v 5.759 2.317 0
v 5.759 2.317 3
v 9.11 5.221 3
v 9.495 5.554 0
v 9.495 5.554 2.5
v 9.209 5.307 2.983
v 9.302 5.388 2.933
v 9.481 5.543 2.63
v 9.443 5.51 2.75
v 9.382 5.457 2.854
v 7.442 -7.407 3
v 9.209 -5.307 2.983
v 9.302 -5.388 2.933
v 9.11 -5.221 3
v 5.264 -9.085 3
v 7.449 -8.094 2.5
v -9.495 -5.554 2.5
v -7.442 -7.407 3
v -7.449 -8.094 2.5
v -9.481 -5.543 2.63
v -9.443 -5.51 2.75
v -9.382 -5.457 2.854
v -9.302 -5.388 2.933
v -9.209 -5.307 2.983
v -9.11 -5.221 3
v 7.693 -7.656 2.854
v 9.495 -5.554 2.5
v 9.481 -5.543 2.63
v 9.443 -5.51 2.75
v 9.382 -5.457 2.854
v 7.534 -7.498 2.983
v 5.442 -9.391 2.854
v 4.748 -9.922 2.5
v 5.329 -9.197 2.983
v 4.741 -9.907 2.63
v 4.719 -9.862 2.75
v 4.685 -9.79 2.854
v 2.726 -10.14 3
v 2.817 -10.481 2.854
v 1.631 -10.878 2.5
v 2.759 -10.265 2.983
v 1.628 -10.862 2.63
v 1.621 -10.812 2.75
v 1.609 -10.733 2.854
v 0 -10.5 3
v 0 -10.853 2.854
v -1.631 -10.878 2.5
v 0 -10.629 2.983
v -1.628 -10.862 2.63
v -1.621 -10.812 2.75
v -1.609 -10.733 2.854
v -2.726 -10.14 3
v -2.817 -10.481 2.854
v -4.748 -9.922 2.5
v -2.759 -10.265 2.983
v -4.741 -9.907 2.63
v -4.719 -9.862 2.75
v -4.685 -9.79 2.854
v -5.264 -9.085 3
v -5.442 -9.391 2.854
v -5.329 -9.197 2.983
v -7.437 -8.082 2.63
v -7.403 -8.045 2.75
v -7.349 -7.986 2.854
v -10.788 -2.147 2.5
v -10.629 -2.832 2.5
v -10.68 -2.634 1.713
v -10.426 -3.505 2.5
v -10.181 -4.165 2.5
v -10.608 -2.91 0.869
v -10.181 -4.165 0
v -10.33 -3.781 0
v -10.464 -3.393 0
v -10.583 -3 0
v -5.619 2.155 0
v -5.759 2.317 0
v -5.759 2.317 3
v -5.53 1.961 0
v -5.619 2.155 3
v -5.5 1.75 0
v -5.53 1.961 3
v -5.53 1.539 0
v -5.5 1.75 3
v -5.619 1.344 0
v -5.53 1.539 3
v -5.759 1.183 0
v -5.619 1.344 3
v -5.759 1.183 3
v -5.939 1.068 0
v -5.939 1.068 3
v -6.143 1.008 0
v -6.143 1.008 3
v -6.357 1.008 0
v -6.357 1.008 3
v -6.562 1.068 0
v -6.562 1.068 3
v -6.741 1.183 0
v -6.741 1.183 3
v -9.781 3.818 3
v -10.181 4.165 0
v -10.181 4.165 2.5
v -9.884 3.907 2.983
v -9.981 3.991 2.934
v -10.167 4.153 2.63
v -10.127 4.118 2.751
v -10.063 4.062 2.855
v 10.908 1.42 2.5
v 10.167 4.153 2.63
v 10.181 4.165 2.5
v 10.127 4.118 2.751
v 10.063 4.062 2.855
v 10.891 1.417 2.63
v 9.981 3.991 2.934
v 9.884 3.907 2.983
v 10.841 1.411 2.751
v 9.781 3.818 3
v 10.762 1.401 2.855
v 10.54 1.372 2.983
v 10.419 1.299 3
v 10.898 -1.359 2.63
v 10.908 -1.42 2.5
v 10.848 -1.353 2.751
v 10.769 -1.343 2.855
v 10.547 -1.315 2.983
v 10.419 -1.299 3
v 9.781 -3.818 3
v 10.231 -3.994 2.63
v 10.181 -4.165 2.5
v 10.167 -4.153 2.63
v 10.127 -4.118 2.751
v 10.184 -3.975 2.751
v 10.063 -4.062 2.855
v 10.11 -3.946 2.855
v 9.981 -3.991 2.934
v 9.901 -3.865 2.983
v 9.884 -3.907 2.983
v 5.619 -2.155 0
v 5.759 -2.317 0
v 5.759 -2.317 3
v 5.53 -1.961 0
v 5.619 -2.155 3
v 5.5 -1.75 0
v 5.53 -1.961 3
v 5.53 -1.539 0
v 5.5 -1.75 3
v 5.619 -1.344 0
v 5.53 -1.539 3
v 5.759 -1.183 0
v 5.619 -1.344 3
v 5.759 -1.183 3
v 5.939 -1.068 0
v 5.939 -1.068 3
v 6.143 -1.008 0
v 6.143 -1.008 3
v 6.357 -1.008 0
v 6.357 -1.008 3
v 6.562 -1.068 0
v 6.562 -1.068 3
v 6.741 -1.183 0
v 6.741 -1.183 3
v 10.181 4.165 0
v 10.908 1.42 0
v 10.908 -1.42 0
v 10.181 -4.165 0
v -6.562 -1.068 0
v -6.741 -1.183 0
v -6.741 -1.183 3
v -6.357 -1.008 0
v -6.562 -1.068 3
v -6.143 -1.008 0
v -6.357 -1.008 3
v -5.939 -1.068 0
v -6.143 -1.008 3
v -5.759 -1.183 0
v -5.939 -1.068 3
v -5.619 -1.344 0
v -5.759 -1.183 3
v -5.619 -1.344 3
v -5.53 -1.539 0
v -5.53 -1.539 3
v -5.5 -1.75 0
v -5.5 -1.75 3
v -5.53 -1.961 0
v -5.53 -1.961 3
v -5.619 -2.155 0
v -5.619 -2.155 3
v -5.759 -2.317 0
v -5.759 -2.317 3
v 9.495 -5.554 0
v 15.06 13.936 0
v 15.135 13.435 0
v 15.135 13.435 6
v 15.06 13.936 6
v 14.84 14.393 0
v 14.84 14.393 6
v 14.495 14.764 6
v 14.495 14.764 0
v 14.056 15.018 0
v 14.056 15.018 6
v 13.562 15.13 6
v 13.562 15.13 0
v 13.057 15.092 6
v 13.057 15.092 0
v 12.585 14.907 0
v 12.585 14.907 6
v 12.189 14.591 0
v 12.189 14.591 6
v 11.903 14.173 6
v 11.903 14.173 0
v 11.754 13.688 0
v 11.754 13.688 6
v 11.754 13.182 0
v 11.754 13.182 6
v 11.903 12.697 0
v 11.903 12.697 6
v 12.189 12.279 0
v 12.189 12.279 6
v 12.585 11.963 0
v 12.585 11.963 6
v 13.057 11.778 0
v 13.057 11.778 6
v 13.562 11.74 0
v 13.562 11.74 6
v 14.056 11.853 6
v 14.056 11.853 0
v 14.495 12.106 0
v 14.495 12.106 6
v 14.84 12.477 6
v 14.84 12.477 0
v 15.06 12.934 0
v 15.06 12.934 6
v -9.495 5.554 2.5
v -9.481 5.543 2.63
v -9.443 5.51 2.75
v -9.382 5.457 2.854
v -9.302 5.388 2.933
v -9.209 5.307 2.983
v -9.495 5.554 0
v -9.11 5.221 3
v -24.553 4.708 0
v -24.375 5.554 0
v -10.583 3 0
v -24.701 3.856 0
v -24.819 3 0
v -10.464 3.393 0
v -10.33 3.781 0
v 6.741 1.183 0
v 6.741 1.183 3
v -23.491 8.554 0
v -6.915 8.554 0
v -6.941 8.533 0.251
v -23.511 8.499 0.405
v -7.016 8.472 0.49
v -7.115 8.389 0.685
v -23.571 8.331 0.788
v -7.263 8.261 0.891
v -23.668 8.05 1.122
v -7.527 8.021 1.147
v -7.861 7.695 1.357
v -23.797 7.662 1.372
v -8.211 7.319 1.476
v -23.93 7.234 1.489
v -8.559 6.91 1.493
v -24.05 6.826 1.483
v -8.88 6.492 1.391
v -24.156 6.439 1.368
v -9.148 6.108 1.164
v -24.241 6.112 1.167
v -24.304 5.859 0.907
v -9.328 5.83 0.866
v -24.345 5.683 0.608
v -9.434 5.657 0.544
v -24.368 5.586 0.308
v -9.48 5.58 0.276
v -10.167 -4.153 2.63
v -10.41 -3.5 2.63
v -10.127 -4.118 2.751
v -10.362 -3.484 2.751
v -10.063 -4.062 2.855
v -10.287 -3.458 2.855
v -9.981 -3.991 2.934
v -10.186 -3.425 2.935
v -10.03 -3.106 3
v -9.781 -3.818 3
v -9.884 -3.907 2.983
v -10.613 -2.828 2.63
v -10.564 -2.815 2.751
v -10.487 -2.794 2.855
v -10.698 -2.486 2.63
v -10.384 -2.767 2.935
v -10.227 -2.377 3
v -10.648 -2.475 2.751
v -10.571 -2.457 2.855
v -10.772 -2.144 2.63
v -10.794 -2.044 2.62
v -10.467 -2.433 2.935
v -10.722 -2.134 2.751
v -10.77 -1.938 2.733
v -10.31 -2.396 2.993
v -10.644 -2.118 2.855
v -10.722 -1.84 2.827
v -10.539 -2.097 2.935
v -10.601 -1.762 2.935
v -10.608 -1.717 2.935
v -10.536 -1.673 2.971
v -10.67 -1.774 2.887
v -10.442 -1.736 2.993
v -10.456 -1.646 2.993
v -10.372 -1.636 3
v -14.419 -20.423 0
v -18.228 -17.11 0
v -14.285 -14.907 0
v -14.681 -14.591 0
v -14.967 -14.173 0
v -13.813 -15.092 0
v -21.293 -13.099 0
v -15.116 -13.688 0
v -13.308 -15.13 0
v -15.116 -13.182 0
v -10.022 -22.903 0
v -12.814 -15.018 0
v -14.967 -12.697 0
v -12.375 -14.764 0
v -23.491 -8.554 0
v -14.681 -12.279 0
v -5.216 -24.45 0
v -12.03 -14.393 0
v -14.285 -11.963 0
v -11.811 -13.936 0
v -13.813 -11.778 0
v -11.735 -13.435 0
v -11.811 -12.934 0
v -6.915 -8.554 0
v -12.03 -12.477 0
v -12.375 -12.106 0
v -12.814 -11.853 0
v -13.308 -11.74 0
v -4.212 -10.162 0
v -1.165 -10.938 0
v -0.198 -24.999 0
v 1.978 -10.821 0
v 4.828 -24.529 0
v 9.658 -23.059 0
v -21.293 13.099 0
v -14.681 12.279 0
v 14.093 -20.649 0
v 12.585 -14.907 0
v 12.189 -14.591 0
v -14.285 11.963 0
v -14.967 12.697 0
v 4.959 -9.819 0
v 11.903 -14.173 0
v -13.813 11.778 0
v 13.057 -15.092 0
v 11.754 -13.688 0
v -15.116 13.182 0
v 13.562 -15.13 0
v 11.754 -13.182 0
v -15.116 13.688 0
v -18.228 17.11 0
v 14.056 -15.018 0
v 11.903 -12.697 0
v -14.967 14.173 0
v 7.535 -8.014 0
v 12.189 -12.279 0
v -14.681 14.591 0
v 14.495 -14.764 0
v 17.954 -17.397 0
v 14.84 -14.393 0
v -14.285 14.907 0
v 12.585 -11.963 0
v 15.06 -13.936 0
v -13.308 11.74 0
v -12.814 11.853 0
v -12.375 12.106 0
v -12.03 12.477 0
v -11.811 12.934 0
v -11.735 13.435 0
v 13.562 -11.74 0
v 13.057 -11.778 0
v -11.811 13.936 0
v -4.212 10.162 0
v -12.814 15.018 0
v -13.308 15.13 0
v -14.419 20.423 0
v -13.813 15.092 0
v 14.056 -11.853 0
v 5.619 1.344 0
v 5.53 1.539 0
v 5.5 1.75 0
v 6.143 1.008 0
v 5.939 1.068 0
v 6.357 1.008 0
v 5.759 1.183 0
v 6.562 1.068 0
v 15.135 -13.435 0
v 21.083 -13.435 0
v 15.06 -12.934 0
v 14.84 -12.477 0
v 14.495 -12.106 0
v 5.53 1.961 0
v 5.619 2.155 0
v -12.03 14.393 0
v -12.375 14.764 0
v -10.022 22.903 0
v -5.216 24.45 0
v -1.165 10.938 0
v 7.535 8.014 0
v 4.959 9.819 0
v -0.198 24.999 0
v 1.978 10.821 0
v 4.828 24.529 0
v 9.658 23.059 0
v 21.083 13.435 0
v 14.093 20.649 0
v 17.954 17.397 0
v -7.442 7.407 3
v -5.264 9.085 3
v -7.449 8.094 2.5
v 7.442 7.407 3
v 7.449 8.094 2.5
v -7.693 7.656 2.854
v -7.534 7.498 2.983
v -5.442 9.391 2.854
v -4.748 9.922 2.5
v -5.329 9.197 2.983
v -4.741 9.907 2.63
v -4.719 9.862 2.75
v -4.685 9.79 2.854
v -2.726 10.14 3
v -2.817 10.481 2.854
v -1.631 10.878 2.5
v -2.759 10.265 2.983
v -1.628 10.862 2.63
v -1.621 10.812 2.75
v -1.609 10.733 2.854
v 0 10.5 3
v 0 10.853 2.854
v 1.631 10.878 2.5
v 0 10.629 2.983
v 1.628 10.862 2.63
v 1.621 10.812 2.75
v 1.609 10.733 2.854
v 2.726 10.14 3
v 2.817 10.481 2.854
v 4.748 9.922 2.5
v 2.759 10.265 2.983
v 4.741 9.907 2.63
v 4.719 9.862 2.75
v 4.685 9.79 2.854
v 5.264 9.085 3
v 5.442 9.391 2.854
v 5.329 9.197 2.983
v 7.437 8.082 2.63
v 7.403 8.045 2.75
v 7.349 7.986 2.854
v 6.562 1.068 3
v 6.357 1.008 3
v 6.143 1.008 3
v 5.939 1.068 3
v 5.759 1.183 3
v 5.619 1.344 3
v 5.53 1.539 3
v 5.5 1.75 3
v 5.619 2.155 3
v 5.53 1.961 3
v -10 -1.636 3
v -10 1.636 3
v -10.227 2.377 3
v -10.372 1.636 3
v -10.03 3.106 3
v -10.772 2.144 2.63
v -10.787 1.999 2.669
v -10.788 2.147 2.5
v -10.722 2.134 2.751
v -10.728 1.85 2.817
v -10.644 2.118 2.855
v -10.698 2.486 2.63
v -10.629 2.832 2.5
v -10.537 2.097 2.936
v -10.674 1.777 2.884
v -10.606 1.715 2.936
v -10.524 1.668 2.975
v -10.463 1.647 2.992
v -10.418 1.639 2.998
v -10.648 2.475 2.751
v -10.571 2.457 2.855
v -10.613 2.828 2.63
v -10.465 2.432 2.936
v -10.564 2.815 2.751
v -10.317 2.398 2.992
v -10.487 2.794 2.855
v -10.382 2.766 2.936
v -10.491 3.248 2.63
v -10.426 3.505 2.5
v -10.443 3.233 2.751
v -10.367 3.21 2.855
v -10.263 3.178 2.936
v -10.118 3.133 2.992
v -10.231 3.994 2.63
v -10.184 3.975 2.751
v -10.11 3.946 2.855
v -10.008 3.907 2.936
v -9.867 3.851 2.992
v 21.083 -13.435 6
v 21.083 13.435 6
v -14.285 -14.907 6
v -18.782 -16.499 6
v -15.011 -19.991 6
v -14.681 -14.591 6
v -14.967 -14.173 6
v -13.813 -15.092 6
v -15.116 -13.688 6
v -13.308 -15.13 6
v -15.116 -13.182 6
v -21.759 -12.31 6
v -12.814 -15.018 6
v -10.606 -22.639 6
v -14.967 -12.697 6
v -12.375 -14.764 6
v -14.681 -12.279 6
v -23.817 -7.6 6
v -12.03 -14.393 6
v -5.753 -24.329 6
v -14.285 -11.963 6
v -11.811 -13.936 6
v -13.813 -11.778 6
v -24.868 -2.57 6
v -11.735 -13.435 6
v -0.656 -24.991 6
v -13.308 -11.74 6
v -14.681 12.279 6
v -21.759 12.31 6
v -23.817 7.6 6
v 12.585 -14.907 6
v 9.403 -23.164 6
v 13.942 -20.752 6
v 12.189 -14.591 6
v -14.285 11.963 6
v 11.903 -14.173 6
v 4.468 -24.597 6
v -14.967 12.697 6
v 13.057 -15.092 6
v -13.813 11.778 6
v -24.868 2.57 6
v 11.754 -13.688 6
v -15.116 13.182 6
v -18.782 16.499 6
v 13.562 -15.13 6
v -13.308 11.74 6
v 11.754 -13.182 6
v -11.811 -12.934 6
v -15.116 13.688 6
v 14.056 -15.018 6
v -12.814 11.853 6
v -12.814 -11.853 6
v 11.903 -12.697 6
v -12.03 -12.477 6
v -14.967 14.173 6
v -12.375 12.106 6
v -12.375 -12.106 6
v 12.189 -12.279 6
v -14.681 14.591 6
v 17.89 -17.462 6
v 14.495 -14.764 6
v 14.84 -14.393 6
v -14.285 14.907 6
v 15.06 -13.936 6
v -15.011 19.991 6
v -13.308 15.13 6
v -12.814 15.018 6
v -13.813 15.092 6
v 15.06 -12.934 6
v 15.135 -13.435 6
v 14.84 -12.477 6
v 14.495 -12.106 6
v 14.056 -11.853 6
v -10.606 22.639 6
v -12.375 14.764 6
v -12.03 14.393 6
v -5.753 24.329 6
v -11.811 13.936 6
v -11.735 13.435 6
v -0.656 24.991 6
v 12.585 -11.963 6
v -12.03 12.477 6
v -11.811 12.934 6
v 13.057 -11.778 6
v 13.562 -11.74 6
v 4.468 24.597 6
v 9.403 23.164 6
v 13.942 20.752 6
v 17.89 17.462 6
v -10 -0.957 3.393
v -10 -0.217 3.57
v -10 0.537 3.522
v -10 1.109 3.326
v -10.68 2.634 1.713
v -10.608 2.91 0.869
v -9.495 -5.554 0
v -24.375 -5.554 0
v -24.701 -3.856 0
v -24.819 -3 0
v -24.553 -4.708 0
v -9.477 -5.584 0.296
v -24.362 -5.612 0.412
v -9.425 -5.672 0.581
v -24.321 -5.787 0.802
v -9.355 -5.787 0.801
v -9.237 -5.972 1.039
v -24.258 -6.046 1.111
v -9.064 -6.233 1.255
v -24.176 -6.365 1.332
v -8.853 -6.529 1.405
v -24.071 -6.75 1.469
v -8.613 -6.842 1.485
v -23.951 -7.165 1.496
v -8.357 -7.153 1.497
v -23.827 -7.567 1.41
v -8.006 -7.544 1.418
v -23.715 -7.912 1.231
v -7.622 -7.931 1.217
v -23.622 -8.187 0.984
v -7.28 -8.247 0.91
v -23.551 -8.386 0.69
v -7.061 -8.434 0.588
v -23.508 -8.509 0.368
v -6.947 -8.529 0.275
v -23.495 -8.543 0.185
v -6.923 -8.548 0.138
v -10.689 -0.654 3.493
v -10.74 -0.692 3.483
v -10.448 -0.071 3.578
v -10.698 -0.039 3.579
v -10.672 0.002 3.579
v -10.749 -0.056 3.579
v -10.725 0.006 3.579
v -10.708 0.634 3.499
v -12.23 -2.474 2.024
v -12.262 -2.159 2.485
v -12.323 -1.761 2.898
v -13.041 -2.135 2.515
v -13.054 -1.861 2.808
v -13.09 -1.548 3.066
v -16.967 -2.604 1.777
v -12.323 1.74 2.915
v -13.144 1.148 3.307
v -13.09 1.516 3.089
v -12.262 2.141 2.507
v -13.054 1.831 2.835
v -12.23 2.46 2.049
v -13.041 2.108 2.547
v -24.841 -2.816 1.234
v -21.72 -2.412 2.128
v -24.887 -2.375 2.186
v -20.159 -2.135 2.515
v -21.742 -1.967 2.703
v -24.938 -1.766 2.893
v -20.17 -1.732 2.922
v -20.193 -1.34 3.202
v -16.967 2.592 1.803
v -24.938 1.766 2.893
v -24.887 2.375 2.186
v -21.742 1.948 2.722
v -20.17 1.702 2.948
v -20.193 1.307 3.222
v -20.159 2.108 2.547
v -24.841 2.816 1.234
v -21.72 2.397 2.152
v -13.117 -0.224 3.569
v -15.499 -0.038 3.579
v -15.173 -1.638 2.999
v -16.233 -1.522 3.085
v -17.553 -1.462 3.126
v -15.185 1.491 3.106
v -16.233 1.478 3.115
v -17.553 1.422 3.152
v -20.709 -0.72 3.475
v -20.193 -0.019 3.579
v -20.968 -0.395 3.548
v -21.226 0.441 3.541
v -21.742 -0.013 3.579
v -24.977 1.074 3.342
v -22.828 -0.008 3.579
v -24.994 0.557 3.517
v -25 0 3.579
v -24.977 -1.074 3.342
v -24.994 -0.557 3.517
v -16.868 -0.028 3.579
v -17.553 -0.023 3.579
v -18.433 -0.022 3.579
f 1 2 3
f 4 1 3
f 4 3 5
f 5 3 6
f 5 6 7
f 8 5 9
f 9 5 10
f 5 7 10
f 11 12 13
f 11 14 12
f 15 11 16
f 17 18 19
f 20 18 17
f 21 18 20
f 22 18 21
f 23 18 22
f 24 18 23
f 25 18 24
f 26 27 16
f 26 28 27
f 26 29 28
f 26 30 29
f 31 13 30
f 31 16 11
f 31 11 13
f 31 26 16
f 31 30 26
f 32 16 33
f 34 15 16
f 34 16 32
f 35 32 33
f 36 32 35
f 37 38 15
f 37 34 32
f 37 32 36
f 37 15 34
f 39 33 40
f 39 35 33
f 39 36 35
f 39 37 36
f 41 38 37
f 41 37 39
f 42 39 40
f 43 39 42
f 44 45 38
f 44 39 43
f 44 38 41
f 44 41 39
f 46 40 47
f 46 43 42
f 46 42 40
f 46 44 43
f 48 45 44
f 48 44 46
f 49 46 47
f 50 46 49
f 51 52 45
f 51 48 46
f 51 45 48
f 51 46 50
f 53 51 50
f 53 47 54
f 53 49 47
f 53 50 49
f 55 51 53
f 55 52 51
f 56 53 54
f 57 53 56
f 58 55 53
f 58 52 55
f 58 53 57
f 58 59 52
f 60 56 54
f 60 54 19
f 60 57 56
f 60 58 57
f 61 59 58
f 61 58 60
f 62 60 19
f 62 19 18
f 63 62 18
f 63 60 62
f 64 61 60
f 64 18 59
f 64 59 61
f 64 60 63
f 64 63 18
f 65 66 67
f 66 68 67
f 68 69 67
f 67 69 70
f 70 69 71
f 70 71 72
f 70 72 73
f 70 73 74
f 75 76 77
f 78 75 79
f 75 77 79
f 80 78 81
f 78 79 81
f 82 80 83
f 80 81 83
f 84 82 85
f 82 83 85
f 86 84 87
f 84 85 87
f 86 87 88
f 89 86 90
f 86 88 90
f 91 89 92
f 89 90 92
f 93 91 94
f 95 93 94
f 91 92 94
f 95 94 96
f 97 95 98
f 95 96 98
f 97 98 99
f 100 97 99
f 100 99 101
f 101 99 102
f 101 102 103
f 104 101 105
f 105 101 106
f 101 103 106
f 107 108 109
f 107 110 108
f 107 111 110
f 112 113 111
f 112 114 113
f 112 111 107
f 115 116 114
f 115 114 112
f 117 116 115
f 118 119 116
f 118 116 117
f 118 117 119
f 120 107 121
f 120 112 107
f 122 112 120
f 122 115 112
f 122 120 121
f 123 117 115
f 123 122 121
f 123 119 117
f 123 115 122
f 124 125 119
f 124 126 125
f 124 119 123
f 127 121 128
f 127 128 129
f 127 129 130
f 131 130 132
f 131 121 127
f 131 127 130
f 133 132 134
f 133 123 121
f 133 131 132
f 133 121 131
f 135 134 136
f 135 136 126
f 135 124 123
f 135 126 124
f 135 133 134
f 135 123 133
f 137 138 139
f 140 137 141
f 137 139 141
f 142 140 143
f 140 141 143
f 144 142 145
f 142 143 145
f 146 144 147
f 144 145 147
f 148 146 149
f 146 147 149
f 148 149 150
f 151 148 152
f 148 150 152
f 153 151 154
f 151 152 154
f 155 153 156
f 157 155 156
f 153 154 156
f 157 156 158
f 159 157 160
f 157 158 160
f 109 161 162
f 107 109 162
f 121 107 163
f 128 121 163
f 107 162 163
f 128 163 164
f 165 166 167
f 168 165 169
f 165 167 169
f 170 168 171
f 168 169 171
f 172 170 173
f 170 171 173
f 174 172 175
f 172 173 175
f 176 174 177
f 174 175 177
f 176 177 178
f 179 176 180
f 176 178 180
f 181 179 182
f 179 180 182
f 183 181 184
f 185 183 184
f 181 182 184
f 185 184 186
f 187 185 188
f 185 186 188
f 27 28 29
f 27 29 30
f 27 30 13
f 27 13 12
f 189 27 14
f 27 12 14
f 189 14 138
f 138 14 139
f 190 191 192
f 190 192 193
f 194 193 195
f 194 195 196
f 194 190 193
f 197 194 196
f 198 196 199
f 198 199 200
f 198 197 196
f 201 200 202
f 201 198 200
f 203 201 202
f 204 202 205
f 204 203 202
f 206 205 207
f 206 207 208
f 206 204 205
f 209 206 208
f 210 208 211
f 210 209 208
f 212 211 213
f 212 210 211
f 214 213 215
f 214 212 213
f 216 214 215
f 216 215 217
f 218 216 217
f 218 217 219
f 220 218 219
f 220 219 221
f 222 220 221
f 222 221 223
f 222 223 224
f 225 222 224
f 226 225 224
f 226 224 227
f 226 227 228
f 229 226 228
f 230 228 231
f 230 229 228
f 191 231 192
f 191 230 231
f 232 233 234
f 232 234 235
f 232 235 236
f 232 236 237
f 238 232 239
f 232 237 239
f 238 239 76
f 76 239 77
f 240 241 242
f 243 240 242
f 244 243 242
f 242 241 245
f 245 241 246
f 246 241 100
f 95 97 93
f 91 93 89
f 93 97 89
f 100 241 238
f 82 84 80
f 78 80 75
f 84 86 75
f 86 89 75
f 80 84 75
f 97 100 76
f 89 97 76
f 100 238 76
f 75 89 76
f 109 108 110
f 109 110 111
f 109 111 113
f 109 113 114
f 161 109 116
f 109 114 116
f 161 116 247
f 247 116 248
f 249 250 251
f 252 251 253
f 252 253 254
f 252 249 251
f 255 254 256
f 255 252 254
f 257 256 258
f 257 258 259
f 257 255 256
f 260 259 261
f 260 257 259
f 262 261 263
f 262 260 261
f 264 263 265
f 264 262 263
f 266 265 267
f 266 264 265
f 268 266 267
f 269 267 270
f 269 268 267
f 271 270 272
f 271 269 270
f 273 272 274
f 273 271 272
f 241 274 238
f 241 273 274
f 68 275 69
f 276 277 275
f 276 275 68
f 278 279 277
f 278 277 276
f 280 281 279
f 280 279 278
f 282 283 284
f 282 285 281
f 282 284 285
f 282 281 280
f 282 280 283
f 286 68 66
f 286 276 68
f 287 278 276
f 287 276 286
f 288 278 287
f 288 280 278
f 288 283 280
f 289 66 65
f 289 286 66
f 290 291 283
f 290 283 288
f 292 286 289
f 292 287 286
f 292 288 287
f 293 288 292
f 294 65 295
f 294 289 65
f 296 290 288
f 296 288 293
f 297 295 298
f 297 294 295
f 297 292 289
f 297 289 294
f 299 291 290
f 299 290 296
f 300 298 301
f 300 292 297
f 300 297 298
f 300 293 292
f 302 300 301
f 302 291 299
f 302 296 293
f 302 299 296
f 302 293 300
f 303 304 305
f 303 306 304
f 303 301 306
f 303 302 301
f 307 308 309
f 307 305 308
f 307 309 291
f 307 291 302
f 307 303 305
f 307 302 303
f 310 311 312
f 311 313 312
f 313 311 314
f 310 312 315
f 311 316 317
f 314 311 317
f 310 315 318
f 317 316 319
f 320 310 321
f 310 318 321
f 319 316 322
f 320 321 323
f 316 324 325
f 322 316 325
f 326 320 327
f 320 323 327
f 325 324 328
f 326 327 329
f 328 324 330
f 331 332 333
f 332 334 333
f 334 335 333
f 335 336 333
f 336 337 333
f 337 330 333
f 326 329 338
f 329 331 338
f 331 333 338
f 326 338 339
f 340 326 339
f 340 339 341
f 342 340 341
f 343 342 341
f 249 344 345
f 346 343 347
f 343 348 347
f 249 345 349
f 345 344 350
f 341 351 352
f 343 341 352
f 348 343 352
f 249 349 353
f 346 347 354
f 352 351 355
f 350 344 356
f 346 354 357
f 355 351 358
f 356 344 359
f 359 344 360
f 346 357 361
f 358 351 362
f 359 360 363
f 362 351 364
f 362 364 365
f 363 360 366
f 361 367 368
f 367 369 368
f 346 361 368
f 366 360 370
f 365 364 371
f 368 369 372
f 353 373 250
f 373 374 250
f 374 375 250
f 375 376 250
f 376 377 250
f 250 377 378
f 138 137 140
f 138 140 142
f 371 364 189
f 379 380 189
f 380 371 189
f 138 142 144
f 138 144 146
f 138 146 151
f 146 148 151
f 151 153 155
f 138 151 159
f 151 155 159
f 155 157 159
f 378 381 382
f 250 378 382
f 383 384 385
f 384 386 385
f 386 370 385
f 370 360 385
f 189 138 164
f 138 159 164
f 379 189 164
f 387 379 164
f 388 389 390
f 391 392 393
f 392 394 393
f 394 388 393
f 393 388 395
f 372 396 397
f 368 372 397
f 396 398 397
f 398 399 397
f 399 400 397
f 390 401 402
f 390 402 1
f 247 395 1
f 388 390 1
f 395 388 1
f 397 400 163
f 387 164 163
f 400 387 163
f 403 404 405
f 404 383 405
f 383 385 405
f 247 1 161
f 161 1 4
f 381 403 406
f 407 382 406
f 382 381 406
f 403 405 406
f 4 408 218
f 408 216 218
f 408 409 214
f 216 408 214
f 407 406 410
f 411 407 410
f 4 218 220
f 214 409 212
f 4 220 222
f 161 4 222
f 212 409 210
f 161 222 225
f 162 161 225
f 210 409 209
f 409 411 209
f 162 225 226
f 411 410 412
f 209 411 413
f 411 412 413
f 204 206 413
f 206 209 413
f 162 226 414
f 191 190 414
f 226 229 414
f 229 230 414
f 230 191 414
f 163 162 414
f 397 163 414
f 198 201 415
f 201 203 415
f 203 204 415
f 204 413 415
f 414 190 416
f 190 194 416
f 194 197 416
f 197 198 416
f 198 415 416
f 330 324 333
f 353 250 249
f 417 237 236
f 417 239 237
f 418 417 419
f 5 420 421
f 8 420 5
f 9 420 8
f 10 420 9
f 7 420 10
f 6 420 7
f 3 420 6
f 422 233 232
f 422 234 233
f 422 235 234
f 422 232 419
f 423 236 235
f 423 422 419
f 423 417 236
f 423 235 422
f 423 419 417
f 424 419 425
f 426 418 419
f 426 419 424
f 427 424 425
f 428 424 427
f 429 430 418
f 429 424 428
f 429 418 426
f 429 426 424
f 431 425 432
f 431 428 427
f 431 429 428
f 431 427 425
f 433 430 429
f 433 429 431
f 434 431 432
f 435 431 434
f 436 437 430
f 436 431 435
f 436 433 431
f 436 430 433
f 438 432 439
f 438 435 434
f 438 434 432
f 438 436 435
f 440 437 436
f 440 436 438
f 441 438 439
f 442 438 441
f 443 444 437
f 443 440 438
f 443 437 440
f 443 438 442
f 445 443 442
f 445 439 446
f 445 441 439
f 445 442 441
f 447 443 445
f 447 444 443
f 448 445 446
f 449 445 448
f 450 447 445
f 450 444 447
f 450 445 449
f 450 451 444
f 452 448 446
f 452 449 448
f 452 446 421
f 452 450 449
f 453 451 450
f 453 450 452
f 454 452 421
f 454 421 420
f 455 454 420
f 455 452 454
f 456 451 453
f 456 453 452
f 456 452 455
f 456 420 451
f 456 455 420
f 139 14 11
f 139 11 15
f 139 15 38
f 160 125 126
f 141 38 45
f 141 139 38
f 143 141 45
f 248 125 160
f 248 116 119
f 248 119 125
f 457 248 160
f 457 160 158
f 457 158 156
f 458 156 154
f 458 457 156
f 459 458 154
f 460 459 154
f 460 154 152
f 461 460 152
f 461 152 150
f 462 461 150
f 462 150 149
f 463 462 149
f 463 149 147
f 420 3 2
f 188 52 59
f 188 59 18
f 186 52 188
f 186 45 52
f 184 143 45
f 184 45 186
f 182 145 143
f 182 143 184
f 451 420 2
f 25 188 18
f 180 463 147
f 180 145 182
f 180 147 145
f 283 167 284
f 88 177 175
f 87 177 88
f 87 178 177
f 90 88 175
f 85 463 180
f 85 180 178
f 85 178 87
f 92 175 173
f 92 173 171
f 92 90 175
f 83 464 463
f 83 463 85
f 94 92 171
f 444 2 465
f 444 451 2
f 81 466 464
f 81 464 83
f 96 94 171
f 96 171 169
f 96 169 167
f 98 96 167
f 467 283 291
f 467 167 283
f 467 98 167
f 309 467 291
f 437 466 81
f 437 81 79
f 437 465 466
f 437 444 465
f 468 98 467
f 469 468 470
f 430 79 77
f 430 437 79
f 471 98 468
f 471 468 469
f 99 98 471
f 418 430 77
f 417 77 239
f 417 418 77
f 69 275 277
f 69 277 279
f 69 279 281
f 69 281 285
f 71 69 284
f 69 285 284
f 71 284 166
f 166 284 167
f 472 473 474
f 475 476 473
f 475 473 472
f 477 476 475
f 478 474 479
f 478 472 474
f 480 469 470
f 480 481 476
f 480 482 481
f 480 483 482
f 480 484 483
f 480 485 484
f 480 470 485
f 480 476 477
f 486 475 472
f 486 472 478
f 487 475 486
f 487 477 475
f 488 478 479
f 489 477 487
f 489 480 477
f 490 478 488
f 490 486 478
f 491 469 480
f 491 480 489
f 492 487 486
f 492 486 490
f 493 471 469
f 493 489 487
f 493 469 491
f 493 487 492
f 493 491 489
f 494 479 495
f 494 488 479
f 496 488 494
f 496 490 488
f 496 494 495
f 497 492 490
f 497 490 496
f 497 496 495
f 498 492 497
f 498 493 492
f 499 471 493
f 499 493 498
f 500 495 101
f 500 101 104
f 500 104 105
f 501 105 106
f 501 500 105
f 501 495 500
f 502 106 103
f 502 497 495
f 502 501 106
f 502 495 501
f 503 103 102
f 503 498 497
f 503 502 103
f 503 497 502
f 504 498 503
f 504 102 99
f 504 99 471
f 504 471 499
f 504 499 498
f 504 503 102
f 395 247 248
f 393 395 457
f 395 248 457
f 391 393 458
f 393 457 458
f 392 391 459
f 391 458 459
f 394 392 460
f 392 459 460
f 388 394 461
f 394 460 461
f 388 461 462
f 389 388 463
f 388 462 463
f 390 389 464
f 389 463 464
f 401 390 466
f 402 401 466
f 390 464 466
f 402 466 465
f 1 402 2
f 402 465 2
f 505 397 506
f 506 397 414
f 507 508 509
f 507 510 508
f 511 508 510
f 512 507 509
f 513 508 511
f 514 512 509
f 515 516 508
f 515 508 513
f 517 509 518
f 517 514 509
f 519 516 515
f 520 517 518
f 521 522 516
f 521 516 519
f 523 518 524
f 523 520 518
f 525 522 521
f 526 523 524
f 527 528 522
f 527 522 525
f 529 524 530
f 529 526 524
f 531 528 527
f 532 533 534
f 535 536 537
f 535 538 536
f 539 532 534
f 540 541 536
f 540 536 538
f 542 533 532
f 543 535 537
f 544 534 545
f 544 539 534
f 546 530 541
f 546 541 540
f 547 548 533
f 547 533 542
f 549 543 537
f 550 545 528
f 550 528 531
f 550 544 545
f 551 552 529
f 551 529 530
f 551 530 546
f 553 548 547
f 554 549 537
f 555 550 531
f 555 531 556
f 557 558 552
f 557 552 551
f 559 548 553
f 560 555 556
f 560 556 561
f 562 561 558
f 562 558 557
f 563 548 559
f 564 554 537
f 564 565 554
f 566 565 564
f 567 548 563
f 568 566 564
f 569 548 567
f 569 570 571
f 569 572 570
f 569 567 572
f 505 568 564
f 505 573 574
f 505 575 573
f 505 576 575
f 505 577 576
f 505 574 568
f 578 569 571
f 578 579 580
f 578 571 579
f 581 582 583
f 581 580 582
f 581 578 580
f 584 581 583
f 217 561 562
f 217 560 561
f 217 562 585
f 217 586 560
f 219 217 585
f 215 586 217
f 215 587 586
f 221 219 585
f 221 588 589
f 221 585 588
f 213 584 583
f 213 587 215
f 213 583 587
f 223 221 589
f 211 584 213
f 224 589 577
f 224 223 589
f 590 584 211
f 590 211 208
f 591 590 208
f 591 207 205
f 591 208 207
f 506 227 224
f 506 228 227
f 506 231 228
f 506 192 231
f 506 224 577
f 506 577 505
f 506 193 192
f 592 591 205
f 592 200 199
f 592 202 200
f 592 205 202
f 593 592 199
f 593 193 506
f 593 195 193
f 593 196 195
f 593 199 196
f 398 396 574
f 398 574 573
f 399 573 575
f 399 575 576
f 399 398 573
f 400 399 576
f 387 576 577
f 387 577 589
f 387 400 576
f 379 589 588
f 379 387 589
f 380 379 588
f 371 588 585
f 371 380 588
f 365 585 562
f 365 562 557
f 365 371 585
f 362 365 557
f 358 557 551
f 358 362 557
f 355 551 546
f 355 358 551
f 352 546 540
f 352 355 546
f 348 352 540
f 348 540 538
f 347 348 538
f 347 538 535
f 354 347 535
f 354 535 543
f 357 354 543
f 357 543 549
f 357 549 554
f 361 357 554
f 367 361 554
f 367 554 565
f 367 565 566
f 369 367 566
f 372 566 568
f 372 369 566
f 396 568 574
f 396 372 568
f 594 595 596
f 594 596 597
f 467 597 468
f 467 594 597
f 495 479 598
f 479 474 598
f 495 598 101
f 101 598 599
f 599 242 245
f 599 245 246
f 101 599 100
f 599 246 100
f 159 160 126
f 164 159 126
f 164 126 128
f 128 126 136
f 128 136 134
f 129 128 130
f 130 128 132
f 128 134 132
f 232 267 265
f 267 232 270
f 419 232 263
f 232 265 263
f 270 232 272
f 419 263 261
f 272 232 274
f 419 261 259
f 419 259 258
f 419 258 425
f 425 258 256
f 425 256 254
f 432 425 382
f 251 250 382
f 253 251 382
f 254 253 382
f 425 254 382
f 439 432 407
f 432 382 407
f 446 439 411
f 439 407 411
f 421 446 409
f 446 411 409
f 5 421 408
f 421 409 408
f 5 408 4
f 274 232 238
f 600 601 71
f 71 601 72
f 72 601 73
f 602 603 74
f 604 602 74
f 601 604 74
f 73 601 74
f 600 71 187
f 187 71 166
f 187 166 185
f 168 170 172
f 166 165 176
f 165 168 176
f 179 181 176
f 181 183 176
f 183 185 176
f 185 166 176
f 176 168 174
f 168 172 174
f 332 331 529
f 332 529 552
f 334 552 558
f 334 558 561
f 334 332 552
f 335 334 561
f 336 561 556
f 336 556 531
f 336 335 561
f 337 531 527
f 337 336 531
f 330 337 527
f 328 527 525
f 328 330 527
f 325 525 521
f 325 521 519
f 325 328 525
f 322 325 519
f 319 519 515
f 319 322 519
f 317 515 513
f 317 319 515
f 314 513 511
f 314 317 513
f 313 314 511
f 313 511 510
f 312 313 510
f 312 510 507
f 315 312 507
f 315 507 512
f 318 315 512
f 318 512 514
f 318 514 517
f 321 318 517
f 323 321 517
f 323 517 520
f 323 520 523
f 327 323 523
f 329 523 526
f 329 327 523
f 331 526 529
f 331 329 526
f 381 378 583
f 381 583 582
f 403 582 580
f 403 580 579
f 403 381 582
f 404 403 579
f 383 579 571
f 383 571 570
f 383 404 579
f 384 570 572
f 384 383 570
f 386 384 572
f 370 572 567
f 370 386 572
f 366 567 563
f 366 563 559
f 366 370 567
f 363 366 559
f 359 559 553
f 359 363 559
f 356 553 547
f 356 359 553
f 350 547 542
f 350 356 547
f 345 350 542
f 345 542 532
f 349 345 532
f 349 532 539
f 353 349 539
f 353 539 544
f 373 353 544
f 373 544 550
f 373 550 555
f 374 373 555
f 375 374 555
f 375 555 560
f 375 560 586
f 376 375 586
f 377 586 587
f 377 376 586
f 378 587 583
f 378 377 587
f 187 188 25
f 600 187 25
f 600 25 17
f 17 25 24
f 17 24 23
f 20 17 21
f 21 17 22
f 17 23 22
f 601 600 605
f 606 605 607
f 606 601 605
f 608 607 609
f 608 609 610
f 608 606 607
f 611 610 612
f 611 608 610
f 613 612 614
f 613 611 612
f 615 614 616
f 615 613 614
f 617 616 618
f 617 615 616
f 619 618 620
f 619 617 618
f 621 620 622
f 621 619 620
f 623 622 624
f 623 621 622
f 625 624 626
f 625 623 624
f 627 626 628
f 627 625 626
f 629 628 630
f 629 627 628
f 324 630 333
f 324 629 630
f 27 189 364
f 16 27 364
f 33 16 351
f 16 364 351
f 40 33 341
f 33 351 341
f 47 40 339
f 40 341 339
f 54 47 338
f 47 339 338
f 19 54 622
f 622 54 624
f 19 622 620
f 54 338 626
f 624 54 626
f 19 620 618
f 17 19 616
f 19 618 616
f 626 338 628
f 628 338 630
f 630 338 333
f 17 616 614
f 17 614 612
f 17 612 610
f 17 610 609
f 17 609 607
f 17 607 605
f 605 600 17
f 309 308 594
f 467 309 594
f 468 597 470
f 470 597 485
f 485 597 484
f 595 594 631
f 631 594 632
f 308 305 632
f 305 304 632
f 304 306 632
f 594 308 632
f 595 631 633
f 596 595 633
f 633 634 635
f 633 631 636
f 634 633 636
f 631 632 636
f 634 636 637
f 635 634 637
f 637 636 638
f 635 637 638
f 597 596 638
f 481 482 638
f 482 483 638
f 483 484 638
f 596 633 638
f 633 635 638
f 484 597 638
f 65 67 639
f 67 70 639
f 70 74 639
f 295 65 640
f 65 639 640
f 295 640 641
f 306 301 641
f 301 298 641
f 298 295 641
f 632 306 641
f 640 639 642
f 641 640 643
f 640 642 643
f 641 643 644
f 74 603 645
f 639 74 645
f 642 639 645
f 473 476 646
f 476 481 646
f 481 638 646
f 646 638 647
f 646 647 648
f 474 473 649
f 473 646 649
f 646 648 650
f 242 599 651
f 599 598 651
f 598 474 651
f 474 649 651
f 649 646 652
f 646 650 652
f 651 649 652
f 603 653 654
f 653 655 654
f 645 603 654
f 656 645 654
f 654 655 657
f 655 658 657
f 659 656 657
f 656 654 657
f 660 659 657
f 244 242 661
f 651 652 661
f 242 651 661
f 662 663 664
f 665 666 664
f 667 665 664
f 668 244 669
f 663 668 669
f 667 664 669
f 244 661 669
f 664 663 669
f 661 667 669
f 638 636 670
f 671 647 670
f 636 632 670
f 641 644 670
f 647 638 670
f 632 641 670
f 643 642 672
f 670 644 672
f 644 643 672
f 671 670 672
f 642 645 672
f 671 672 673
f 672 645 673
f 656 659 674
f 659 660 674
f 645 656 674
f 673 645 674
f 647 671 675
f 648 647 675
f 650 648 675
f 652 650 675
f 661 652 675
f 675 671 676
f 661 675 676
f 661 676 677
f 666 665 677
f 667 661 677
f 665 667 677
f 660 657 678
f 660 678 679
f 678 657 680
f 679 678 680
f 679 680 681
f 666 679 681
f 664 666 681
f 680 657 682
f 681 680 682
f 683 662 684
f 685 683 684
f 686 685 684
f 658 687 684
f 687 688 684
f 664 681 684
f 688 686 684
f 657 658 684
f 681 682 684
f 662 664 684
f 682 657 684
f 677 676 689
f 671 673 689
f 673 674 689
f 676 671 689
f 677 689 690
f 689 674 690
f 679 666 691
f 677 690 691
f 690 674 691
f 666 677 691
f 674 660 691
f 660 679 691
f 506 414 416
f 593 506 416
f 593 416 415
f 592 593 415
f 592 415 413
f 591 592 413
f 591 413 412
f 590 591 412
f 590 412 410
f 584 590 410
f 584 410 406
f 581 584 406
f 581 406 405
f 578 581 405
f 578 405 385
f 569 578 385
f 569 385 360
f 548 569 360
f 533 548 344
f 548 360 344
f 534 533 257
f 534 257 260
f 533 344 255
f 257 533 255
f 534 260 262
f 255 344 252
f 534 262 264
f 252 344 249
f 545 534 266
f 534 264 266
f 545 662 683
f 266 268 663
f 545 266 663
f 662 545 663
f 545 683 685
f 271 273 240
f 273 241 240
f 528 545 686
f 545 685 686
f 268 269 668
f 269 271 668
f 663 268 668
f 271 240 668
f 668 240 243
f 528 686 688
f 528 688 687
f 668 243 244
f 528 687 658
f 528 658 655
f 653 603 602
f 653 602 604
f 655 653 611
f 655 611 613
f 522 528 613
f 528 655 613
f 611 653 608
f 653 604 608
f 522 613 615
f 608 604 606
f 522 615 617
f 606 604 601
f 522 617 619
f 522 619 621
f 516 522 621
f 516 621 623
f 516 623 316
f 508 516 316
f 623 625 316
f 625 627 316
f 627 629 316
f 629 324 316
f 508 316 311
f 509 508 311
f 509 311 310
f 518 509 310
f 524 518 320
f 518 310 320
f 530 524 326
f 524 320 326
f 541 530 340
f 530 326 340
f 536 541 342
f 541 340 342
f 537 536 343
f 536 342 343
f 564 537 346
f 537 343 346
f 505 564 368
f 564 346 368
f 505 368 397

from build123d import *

# Parameters (mm, degrees)
ESQUISSE1_R             = 25
ESQUISSE1_R_2           = 1.7
BOSS_EXTRU_1_DEPTH      = 6
ESQUISSE6_R             = 11
ENL_V_MAT_EXTRU_2_DEPTH = 3
CONG_2_R                = 0.5
BOSS_EXTRU_6_DEPTH      = 6
ESQUISSE12_RX           = 3.57944127
ESQUISSE12_RY           = 3
ENL_V_MAT_EXTRU_3_DEPTH = 15
ESQUISSE13_W            = 18.660647855
ESQUISSE13_H            = 1.5
ESQUISSE14_W            = 18.40878356
ESQUISSE14_H            = 1.5
ESQUISSE15_W            = 7.963879273
ESQUISSE15_H            = 27.450042448
ENL_V_MAT_EXTRU_4_DEPTH = 36.860842729


with BuildPart() as part:
    # Esquisse1 → Boss.-Extru.1 (new body)
    with BuildSketch(Plane.XY):
        Circle(ESQUISSE1_R)
        with Locations((-13.435028843, 13.435028843)):
            Circle(ESQUISSE1_R_2, mode=Mode.SUBTRACT)
        with Locations((13.435028843, 13.435028843)):
            Circle(ESQUISSE1_R_2, mode=Mode.SUBTRACT)
        with Locations((13.435028843, -13.435028843)):
            Circle(ESQUISSE1_R_2, mode=Mode.SUBTRACT)
        with Locations((-13.435028843, -13.435028843)):
            Circle(ESQUISSE1_R_2, mode=Mode.SUBTRACT)
    extrude(amount=BOSS_EXTRU_1_DEPTH)

    # Esquisse6 → Enlèv. mat.-Extru.2 (cut)
    with BuildSketch(Plane(origin=(0, 0, 0), x_dir=(-1, 0, 0), z_dir=(0, 0, -1))):
        Circle(ESQUISSE6_R)
    extrude(amount=-ENL_V_MAT_EXTRU_2_DEPTH, mode=Mode.SUBTRACT)

    # Congé2
    cong_2_edges = [part.edges().sort_by_distance(p)[0] for p in [
        (11, 0, 3),
    ]]
    fillet(cong_2_edges, radius=CONG_2_R)

    # Esquisse10 → Boss.-Extru.6 (add)
    with BuildSketch(Plane.XY.offset(6)):
        with BuildLine():
            Line((-5.758802096, -2.316766812), (-9.508802096, -5.566766812))
            ThreePointArc((-9.508802096, -5.566766812), (-10.566766812, -5.491197904), (-10.491197904, -4.433233188))
            Line((-10.491197904, -4.433233188), (-6.741197904, -1.183233188))
            ThreePointArc((-6.741197904, -1.183233188), (-5.683233188, -1.258802096), (-5.758802096, -2.316766812))
        make_face()
        with BuildLine():
            Line((-6.741197904, 1.183233188), (-10.491197904, 4.433233188))
            ThreePointArc((-10.491197904, 4.433233188), (-10.566766812, 5.491197904), (-9.508802096, 5.566766812))
            Line((-9.508802096, 5.566766812), (-5.758802096, 2.316766812))
            ThreePointArc((-5.758802096, 2.316766812), (-5.683233188, 1.258802096), (-6.741197904, 1.183233188))
        make_face()
        with BuildLine():
            Line((9.508802096, -5.566766812), (5.758802096, -2.316766812))
            ThreePointArc((5.758802096, -2.316766812), (5.683233188, -1.258802096), (6.741197904, -1.183233188))
            Line((6.741197904, -1.183233188), (10.491197904, -4.433233188))
            ThreePointArc((10.491197904, -4.433233188), (10.566766812, -5.491197904), (9.508802096, -5.566766812))
        make_face()
        with BuildLine():
            Line((10.491197904, 4.433233188), (6.741197904, 1.183233188))
            ThreePointArc((6.741197904, 1.183233188), (5.683233188, 1.258802096), (5.758802096, 2.316766812))
            Line((5.758802096, 2.316766812), (9.508802096, 5.566766812))
            ThreePointArc((9.508802096, 5.566766812), (10.566766812, 5.491197904), (10.491197904, 4.433233188))
        make_face()
    extrude(amount=-BOSS_EXTRU_6_DEPTH)

    # Esquisse12 → Enlèv. mat.-Extru.3 (cut)
    with BuildSketch(Plane.ZY.offset(25)):
        with Locations(Location((0, 0), (0, 0, 180))):
            Ellipse(ESQUISSE12_RX, ESQUISSE12_RY)
    extrude(amount=-ENL_V_MAT_EXTRU_3_DEPTH, mode=Mode.SUBTRACT)

    # Esquisse13 → Enlèvement de matière-Révolution1 (revolve, cut)
    with BuildSketch(Plane(origin=(0, 0, 0), x_dir=(-1, 0, 0), z_dir=(0, 0, -1))):
        with Locations((15.635249349, 6.304475395)):
            Rectangle(ESQUISSE13_W, ESQUISSE13_H)
    revolve(axis=Axis((-24.965573276, 7.054475395, 0), (1, 0, 0)), mode=Mode.SUBTRACT)

    # Esquisse14 → Enlèvement de matière-Révolution2 (revolve, cut)
    with BuildSketch(Plane(origin=(0, 0, 0), x_dir=(-1, 0, 0), z_dir=(0, 0, -1))):
        with Locations((15.170755462, -6.304475395)):
            Rectangle(ESQUISSE14_W, ESQUISSE14_H)
    revolve(axis=Axis((-24.375147242, -7.054475395, 0), (1, 0, 0)), mode=Mode.SUBTRACT)

    # Esquisse15 → Enlèv. mat.-Extru.4 (cut, through all)
    with BuildSketch(Plane(origin=(0, 0, 0), x_dir=(-1, 0, 0), z_dir=(0, 0, -1))):
        with Locations((-25.065108278, -0.289992381)):
            Rectangle(ESQUISSE15_W, ESQUISSE15_H)
    extrude(amount=-ENL_V_MAT_EXTRU_4_DEPTH, mode=Mode.SUBTRACT)


solid = part.part
